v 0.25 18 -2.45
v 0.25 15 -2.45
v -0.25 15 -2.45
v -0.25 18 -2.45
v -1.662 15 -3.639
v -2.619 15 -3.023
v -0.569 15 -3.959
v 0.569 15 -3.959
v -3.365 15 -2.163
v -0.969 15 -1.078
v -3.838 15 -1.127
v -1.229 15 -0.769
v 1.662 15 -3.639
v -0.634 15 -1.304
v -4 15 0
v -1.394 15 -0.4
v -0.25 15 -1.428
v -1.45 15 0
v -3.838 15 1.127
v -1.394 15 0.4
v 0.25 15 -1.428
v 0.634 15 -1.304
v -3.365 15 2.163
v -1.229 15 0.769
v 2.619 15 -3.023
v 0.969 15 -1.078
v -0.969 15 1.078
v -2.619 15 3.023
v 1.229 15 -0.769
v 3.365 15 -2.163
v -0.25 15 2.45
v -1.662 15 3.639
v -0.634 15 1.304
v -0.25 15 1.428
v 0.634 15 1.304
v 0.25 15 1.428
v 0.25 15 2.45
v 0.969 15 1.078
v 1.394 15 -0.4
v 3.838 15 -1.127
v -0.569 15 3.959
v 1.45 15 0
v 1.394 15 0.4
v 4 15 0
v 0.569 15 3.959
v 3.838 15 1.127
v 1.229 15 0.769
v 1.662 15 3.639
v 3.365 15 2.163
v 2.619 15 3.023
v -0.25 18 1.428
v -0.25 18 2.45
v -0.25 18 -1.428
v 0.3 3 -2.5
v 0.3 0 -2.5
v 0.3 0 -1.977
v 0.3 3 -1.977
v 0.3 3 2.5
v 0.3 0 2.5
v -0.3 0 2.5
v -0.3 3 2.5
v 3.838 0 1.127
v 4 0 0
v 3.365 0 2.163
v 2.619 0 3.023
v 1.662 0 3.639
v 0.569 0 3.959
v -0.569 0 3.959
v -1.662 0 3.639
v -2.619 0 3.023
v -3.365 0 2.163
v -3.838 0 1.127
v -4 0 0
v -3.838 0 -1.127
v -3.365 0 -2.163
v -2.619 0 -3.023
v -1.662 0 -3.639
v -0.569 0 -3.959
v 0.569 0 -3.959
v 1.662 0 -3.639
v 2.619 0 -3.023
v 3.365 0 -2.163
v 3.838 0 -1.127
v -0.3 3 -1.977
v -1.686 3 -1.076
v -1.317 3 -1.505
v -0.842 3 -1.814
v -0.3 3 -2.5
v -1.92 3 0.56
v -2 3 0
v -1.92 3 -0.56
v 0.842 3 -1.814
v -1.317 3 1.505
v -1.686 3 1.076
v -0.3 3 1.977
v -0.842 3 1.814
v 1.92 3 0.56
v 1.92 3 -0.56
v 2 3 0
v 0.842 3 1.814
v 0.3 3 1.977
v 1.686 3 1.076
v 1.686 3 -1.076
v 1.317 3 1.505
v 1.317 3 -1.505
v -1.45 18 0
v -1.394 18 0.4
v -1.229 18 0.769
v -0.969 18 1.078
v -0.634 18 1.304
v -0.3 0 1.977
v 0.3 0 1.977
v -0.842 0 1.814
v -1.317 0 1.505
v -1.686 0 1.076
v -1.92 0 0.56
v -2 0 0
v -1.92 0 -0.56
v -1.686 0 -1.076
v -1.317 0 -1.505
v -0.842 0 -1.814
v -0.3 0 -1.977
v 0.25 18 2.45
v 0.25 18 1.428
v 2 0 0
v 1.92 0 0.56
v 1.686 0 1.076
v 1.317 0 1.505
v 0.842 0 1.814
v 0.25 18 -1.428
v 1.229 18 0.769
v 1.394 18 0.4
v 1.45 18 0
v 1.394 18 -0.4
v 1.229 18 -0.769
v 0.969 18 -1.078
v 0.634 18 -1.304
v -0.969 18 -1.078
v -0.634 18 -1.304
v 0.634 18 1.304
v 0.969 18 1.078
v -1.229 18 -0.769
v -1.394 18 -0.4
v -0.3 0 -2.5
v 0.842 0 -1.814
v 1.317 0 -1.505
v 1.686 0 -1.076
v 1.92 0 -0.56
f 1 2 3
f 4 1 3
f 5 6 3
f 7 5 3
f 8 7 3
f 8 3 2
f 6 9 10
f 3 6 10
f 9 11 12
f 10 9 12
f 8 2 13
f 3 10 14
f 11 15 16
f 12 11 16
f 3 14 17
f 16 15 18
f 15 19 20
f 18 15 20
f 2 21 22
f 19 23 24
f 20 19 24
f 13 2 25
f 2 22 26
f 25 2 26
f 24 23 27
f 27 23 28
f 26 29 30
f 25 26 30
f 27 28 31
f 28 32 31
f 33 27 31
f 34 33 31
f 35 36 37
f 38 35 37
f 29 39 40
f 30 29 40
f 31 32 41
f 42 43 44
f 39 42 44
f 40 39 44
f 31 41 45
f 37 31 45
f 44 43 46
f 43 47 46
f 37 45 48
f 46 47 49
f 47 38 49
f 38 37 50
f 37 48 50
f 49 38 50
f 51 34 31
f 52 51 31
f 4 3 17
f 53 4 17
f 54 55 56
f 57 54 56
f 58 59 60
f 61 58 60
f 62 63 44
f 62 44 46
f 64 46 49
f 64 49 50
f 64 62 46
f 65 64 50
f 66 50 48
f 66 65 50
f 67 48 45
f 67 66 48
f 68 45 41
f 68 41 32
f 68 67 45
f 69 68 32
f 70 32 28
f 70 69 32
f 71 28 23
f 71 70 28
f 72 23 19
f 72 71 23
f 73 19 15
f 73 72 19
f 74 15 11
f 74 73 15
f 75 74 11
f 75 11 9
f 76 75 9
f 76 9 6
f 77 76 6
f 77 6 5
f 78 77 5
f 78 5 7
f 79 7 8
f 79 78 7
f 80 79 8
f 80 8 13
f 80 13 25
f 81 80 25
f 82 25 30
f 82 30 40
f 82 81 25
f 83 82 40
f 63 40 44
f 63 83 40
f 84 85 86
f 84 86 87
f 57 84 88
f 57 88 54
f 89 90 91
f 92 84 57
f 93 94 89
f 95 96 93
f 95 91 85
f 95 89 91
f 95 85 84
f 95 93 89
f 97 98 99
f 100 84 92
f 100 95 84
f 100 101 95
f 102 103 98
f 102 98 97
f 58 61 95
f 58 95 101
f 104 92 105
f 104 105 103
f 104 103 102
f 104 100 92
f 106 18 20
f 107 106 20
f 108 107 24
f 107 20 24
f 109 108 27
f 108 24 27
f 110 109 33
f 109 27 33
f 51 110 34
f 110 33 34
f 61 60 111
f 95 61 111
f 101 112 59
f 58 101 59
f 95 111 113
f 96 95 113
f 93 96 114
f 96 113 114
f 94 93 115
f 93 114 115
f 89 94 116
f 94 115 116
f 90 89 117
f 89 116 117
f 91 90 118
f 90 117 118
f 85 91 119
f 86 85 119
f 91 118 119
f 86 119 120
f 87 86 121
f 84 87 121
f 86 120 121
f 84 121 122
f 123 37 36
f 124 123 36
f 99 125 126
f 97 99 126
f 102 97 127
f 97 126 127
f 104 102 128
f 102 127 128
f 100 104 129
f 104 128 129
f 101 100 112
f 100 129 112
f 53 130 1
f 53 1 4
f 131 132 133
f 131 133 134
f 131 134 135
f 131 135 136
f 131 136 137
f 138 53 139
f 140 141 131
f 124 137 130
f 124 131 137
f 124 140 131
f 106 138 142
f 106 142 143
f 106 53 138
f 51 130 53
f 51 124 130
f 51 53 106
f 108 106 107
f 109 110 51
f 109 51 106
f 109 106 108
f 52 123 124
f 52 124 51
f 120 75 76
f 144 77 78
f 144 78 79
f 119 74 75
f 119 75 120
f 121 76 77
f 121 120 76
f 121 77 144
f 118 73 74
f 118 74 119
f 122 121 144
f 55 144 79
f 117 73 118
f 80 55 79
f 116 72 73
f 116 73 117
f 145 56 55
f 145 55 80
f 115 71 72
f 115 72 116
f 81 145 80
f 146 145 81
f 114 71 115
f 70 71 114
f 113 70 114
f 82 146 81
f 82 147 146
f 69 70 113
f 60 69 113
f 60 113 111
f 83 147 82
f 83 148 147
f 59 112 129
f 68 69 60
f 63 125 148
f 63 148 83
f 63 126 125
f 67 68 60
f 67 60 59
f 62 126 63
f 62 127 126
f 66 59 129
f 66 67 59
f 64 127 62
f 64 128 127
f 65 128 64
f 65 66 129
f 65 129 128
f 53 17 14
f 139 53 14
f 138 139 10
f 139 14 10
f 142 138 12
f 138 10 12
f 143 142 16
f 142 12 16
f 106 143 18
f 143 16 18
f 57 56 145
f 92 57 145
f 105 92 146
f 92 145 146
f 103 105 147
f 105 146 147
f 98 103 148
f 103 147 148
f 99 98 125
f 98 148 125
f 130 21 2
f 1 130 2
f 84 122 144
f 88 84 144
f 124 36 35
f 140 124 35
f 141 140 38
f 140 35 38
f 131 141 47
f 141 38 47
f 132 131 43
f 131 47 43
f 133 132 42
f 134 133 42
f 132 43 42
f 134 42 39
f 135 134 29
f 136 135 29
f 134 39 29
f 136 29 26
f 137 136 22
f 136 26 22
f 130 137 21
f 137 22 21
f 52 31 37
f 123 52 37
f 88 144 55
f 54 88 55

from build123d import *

# Parameters (mm, degrees)
F0_R     = 4
F1_DEPTH = 15
F2_DEPTH = 3
F4_DEPTH = 3


with BuildPart() as f1:
    # F0 (on Front) → F1 (new body)
    with BuildSketch(Plane.XZ):
        Circle(F0_R)
        with BuildLine():
            ThreePointArc((0.3, 1.9773719933), (1.5165750888, 1.303840481), (2, 0))
            ThreePointArc((2, 0), (1.5165750888, -1.303840481), (0.3, -1.9773719933))
            Line((0.3, -1.9773719933), (0.3, -2.5))
            Line((0.3, -2.5), (-0.3, -2.5))
            Line((-0.3, -2.5), (-0.3, -1.9773719933))
            ThreePointArc((-0.3, -1.9773719933), (-2, 0), (-0.3, 1.9773719933))
            Line((-0.3, 1.9773719933), (-0.3, 2.5))
            Line((-0.3, 2.5), (0.3, 2.5))
            Line((0.3, 2.5), (0.3, 1.9773719933))
        make_face(mode=Mode.SUBTRACT)
        with BuildLine():
            ThreePointArc((0.3, -1.9773719933), (1.5165750888, -1.303840481), (2, 0))
            ThreePointArc((2, 0), (1.5165750888, 1.303840481), (0.3, 1.9773719933))
            Line((0.3, 1.9773719933), (0.3, -1.9773719933))
        make_face()
        with BuildLine():
            Line((-0.3, -1.9773719933), (-0.3, 1.9773719933))
            ThreePointArc((-0.3, 1.9773719933), (-2, 0), (-0.3, -1.9773719933))
        make_face()
        with BuildLine():
            Line((0.3, -1.9773719933), (0.3, 1.9773719933))
            ThreePointArc((0.3, 1.9773719933), (0, 2), (-0.3, 1.9773719933))
            Line((-0.3, 1.9773719933), (-0.3, -1.9773719933))
            ThreePointArc((-0.3, -1.9773719933), (0, -2), (0.3, -1.9773719933))
        make_face()
        with BuildLine():
            ThreePointArc((-0.3, 1.9773719933), (0, 2), (0.3, 1.9773719933))
            Line((0.3, 1.9773719933), (0.3, 2.5))
            Line((0.3, 2.5), (-0.3, 2.5))
            Line((-0.3, 2.5), (-0.3, 1.9773719933))
        make_face()
        with BuildLine():
            Line((0.3, -2.5), (0.3, -1.9773719933))
            ThreePointArc((0.3, -1.9773719933), (0, -2), (-0.3, -1.9773719933))
            Line((-0.3, -1.9773719933), (-0.3, -2.5))
            Line((-0.3, -2.5), (0.3, -2.5))
        make_face()
    extrude(amount=-F1_DEPTH)

    # F0 (on Front) → F2 (cut)
    with BuildSketch(Plane.XZ):
        with BuildLine():
            Line((0.3, -1.9773719933), (0.3, 1.9773719933))
            ThreePointArc((0.3, 1.9773719933), (0, 2), (-0.3, 1.9773719933))
            Line((-0.3, 1.9773719933), (-0.3, -1.9773719933))
            ThreePointArc((-0.3, -1.9773719933), (0, -2), (0.3, -1.9773719933))
        make_face()
        with BuildLine():
            ThreePointArc((0.3, -1.9773719933), (1.5165750888, -1.303840481), (2, 0))
            ThreePointArc((2, 0), (1.5165750888, 1.303840481), (0.3, 1.9773719933))
            Line((0.3, 1.9773719933), (0.3, -1.9773719933))
        make_face()
        with BuildLine():
            ThreePointArc((-0.3, 1.9773719933), (0, 2), (0.3, 1.9773719933))
            Line((0.3, 1.9773719933), (0.3, 2.5))
            Line((0.3, 2.5), (-0.3, 2.5))
            Line((-0.3, 2.5), (-0.3, 1.9773719933))
        make_face()
        with BuildLine():
            Line((-0.3, -1.9773719933), (-0.3, 1.9773719933))
            ThreePointArc((-0.3, 1.9773719933), (-2, 0), (-0.3, -1.9773719933))
        make_face()
        with BuildLine():
            Line((0.3, -2.5), (0.3, -1.9773719933))
            ThreePointArc((0.3, -1.9773719933), (0, -2), (-0.3, -1.9773719933))
            Line((-0.3, -1.9773719933), (-0.3, -2.5))
            Line((-0.3, -2.5), (0.3, -2.5))
        make_face()
    extrude(amount=-F2_DEPTH, mode=Mode.SUBTRACT)

    # F3 (on face) → F4 (join)
    with BuildSketch(Plane(origin=(0, 15, 0), x_dir=(-1, 0, 0), z_dir=(0, 1, 0))):
        with BuildLine():
            Line((-0.25, -1.4282856857), (-0.25, 1.4282856857))
            ThreePointArc((-0.25, 1.4282856857), (-1.45, 0), (-0.25, -1.4282856857))
        make_face()
        with BuildLine():
            Line((0.25, -1.4282856857), (0.25, 1.4282856857))
            ThreePointArc((0.25, 1.4282856857), (0, 1.45), (-0.25, 1.4282856857))
            Line((-0.25, 1.4282856857), (-0.25, -1.4282856857))
            ThreePointArc((-0.25, -1.4282856857), (0, -1.45), (0.25, -1.4282856857))
        make_face()
        with BuildLine():
            ThreePointArc((0.25, -1.4282856857), (1.1101801656, -0.9327379053), (1.45, 0))
            ThreePointArc((1.45, 0), (1.1101801656, 0.9327379053), (0.25, 1.4282856857))
            Line((0.25, 1.4282856857), (0.25, -1.4282856857))
        make_face()
        with BuildLine():
            ThreePointArc((-0.25, 1.4282856857), (0, 1.45), (0.25, 1.4282856857))
            Line((0.25, 1.4282856857), (0.25, 2.45))
            Line((0.25, 2.45), (-0.25, 2.45))
            Line((-0.25, 2.45), (-0.25, 1.4282856857))
        make_face()
        with BuildLine():
            Line((0.25, -2.45), (0.25, -1.4282856857))
            ThreePointArc((0.25, -1.4282856857), (0, -1.45), (-0.25, -1.4282856857))
            Line((-0.25, -1.4282856857), (-0.25, -2.45))
            Line((-0.25, -2.45), (0.25, -2.45))
        make_face()
    extrude(amount=F4_DEPTH)


solid = f1.part
